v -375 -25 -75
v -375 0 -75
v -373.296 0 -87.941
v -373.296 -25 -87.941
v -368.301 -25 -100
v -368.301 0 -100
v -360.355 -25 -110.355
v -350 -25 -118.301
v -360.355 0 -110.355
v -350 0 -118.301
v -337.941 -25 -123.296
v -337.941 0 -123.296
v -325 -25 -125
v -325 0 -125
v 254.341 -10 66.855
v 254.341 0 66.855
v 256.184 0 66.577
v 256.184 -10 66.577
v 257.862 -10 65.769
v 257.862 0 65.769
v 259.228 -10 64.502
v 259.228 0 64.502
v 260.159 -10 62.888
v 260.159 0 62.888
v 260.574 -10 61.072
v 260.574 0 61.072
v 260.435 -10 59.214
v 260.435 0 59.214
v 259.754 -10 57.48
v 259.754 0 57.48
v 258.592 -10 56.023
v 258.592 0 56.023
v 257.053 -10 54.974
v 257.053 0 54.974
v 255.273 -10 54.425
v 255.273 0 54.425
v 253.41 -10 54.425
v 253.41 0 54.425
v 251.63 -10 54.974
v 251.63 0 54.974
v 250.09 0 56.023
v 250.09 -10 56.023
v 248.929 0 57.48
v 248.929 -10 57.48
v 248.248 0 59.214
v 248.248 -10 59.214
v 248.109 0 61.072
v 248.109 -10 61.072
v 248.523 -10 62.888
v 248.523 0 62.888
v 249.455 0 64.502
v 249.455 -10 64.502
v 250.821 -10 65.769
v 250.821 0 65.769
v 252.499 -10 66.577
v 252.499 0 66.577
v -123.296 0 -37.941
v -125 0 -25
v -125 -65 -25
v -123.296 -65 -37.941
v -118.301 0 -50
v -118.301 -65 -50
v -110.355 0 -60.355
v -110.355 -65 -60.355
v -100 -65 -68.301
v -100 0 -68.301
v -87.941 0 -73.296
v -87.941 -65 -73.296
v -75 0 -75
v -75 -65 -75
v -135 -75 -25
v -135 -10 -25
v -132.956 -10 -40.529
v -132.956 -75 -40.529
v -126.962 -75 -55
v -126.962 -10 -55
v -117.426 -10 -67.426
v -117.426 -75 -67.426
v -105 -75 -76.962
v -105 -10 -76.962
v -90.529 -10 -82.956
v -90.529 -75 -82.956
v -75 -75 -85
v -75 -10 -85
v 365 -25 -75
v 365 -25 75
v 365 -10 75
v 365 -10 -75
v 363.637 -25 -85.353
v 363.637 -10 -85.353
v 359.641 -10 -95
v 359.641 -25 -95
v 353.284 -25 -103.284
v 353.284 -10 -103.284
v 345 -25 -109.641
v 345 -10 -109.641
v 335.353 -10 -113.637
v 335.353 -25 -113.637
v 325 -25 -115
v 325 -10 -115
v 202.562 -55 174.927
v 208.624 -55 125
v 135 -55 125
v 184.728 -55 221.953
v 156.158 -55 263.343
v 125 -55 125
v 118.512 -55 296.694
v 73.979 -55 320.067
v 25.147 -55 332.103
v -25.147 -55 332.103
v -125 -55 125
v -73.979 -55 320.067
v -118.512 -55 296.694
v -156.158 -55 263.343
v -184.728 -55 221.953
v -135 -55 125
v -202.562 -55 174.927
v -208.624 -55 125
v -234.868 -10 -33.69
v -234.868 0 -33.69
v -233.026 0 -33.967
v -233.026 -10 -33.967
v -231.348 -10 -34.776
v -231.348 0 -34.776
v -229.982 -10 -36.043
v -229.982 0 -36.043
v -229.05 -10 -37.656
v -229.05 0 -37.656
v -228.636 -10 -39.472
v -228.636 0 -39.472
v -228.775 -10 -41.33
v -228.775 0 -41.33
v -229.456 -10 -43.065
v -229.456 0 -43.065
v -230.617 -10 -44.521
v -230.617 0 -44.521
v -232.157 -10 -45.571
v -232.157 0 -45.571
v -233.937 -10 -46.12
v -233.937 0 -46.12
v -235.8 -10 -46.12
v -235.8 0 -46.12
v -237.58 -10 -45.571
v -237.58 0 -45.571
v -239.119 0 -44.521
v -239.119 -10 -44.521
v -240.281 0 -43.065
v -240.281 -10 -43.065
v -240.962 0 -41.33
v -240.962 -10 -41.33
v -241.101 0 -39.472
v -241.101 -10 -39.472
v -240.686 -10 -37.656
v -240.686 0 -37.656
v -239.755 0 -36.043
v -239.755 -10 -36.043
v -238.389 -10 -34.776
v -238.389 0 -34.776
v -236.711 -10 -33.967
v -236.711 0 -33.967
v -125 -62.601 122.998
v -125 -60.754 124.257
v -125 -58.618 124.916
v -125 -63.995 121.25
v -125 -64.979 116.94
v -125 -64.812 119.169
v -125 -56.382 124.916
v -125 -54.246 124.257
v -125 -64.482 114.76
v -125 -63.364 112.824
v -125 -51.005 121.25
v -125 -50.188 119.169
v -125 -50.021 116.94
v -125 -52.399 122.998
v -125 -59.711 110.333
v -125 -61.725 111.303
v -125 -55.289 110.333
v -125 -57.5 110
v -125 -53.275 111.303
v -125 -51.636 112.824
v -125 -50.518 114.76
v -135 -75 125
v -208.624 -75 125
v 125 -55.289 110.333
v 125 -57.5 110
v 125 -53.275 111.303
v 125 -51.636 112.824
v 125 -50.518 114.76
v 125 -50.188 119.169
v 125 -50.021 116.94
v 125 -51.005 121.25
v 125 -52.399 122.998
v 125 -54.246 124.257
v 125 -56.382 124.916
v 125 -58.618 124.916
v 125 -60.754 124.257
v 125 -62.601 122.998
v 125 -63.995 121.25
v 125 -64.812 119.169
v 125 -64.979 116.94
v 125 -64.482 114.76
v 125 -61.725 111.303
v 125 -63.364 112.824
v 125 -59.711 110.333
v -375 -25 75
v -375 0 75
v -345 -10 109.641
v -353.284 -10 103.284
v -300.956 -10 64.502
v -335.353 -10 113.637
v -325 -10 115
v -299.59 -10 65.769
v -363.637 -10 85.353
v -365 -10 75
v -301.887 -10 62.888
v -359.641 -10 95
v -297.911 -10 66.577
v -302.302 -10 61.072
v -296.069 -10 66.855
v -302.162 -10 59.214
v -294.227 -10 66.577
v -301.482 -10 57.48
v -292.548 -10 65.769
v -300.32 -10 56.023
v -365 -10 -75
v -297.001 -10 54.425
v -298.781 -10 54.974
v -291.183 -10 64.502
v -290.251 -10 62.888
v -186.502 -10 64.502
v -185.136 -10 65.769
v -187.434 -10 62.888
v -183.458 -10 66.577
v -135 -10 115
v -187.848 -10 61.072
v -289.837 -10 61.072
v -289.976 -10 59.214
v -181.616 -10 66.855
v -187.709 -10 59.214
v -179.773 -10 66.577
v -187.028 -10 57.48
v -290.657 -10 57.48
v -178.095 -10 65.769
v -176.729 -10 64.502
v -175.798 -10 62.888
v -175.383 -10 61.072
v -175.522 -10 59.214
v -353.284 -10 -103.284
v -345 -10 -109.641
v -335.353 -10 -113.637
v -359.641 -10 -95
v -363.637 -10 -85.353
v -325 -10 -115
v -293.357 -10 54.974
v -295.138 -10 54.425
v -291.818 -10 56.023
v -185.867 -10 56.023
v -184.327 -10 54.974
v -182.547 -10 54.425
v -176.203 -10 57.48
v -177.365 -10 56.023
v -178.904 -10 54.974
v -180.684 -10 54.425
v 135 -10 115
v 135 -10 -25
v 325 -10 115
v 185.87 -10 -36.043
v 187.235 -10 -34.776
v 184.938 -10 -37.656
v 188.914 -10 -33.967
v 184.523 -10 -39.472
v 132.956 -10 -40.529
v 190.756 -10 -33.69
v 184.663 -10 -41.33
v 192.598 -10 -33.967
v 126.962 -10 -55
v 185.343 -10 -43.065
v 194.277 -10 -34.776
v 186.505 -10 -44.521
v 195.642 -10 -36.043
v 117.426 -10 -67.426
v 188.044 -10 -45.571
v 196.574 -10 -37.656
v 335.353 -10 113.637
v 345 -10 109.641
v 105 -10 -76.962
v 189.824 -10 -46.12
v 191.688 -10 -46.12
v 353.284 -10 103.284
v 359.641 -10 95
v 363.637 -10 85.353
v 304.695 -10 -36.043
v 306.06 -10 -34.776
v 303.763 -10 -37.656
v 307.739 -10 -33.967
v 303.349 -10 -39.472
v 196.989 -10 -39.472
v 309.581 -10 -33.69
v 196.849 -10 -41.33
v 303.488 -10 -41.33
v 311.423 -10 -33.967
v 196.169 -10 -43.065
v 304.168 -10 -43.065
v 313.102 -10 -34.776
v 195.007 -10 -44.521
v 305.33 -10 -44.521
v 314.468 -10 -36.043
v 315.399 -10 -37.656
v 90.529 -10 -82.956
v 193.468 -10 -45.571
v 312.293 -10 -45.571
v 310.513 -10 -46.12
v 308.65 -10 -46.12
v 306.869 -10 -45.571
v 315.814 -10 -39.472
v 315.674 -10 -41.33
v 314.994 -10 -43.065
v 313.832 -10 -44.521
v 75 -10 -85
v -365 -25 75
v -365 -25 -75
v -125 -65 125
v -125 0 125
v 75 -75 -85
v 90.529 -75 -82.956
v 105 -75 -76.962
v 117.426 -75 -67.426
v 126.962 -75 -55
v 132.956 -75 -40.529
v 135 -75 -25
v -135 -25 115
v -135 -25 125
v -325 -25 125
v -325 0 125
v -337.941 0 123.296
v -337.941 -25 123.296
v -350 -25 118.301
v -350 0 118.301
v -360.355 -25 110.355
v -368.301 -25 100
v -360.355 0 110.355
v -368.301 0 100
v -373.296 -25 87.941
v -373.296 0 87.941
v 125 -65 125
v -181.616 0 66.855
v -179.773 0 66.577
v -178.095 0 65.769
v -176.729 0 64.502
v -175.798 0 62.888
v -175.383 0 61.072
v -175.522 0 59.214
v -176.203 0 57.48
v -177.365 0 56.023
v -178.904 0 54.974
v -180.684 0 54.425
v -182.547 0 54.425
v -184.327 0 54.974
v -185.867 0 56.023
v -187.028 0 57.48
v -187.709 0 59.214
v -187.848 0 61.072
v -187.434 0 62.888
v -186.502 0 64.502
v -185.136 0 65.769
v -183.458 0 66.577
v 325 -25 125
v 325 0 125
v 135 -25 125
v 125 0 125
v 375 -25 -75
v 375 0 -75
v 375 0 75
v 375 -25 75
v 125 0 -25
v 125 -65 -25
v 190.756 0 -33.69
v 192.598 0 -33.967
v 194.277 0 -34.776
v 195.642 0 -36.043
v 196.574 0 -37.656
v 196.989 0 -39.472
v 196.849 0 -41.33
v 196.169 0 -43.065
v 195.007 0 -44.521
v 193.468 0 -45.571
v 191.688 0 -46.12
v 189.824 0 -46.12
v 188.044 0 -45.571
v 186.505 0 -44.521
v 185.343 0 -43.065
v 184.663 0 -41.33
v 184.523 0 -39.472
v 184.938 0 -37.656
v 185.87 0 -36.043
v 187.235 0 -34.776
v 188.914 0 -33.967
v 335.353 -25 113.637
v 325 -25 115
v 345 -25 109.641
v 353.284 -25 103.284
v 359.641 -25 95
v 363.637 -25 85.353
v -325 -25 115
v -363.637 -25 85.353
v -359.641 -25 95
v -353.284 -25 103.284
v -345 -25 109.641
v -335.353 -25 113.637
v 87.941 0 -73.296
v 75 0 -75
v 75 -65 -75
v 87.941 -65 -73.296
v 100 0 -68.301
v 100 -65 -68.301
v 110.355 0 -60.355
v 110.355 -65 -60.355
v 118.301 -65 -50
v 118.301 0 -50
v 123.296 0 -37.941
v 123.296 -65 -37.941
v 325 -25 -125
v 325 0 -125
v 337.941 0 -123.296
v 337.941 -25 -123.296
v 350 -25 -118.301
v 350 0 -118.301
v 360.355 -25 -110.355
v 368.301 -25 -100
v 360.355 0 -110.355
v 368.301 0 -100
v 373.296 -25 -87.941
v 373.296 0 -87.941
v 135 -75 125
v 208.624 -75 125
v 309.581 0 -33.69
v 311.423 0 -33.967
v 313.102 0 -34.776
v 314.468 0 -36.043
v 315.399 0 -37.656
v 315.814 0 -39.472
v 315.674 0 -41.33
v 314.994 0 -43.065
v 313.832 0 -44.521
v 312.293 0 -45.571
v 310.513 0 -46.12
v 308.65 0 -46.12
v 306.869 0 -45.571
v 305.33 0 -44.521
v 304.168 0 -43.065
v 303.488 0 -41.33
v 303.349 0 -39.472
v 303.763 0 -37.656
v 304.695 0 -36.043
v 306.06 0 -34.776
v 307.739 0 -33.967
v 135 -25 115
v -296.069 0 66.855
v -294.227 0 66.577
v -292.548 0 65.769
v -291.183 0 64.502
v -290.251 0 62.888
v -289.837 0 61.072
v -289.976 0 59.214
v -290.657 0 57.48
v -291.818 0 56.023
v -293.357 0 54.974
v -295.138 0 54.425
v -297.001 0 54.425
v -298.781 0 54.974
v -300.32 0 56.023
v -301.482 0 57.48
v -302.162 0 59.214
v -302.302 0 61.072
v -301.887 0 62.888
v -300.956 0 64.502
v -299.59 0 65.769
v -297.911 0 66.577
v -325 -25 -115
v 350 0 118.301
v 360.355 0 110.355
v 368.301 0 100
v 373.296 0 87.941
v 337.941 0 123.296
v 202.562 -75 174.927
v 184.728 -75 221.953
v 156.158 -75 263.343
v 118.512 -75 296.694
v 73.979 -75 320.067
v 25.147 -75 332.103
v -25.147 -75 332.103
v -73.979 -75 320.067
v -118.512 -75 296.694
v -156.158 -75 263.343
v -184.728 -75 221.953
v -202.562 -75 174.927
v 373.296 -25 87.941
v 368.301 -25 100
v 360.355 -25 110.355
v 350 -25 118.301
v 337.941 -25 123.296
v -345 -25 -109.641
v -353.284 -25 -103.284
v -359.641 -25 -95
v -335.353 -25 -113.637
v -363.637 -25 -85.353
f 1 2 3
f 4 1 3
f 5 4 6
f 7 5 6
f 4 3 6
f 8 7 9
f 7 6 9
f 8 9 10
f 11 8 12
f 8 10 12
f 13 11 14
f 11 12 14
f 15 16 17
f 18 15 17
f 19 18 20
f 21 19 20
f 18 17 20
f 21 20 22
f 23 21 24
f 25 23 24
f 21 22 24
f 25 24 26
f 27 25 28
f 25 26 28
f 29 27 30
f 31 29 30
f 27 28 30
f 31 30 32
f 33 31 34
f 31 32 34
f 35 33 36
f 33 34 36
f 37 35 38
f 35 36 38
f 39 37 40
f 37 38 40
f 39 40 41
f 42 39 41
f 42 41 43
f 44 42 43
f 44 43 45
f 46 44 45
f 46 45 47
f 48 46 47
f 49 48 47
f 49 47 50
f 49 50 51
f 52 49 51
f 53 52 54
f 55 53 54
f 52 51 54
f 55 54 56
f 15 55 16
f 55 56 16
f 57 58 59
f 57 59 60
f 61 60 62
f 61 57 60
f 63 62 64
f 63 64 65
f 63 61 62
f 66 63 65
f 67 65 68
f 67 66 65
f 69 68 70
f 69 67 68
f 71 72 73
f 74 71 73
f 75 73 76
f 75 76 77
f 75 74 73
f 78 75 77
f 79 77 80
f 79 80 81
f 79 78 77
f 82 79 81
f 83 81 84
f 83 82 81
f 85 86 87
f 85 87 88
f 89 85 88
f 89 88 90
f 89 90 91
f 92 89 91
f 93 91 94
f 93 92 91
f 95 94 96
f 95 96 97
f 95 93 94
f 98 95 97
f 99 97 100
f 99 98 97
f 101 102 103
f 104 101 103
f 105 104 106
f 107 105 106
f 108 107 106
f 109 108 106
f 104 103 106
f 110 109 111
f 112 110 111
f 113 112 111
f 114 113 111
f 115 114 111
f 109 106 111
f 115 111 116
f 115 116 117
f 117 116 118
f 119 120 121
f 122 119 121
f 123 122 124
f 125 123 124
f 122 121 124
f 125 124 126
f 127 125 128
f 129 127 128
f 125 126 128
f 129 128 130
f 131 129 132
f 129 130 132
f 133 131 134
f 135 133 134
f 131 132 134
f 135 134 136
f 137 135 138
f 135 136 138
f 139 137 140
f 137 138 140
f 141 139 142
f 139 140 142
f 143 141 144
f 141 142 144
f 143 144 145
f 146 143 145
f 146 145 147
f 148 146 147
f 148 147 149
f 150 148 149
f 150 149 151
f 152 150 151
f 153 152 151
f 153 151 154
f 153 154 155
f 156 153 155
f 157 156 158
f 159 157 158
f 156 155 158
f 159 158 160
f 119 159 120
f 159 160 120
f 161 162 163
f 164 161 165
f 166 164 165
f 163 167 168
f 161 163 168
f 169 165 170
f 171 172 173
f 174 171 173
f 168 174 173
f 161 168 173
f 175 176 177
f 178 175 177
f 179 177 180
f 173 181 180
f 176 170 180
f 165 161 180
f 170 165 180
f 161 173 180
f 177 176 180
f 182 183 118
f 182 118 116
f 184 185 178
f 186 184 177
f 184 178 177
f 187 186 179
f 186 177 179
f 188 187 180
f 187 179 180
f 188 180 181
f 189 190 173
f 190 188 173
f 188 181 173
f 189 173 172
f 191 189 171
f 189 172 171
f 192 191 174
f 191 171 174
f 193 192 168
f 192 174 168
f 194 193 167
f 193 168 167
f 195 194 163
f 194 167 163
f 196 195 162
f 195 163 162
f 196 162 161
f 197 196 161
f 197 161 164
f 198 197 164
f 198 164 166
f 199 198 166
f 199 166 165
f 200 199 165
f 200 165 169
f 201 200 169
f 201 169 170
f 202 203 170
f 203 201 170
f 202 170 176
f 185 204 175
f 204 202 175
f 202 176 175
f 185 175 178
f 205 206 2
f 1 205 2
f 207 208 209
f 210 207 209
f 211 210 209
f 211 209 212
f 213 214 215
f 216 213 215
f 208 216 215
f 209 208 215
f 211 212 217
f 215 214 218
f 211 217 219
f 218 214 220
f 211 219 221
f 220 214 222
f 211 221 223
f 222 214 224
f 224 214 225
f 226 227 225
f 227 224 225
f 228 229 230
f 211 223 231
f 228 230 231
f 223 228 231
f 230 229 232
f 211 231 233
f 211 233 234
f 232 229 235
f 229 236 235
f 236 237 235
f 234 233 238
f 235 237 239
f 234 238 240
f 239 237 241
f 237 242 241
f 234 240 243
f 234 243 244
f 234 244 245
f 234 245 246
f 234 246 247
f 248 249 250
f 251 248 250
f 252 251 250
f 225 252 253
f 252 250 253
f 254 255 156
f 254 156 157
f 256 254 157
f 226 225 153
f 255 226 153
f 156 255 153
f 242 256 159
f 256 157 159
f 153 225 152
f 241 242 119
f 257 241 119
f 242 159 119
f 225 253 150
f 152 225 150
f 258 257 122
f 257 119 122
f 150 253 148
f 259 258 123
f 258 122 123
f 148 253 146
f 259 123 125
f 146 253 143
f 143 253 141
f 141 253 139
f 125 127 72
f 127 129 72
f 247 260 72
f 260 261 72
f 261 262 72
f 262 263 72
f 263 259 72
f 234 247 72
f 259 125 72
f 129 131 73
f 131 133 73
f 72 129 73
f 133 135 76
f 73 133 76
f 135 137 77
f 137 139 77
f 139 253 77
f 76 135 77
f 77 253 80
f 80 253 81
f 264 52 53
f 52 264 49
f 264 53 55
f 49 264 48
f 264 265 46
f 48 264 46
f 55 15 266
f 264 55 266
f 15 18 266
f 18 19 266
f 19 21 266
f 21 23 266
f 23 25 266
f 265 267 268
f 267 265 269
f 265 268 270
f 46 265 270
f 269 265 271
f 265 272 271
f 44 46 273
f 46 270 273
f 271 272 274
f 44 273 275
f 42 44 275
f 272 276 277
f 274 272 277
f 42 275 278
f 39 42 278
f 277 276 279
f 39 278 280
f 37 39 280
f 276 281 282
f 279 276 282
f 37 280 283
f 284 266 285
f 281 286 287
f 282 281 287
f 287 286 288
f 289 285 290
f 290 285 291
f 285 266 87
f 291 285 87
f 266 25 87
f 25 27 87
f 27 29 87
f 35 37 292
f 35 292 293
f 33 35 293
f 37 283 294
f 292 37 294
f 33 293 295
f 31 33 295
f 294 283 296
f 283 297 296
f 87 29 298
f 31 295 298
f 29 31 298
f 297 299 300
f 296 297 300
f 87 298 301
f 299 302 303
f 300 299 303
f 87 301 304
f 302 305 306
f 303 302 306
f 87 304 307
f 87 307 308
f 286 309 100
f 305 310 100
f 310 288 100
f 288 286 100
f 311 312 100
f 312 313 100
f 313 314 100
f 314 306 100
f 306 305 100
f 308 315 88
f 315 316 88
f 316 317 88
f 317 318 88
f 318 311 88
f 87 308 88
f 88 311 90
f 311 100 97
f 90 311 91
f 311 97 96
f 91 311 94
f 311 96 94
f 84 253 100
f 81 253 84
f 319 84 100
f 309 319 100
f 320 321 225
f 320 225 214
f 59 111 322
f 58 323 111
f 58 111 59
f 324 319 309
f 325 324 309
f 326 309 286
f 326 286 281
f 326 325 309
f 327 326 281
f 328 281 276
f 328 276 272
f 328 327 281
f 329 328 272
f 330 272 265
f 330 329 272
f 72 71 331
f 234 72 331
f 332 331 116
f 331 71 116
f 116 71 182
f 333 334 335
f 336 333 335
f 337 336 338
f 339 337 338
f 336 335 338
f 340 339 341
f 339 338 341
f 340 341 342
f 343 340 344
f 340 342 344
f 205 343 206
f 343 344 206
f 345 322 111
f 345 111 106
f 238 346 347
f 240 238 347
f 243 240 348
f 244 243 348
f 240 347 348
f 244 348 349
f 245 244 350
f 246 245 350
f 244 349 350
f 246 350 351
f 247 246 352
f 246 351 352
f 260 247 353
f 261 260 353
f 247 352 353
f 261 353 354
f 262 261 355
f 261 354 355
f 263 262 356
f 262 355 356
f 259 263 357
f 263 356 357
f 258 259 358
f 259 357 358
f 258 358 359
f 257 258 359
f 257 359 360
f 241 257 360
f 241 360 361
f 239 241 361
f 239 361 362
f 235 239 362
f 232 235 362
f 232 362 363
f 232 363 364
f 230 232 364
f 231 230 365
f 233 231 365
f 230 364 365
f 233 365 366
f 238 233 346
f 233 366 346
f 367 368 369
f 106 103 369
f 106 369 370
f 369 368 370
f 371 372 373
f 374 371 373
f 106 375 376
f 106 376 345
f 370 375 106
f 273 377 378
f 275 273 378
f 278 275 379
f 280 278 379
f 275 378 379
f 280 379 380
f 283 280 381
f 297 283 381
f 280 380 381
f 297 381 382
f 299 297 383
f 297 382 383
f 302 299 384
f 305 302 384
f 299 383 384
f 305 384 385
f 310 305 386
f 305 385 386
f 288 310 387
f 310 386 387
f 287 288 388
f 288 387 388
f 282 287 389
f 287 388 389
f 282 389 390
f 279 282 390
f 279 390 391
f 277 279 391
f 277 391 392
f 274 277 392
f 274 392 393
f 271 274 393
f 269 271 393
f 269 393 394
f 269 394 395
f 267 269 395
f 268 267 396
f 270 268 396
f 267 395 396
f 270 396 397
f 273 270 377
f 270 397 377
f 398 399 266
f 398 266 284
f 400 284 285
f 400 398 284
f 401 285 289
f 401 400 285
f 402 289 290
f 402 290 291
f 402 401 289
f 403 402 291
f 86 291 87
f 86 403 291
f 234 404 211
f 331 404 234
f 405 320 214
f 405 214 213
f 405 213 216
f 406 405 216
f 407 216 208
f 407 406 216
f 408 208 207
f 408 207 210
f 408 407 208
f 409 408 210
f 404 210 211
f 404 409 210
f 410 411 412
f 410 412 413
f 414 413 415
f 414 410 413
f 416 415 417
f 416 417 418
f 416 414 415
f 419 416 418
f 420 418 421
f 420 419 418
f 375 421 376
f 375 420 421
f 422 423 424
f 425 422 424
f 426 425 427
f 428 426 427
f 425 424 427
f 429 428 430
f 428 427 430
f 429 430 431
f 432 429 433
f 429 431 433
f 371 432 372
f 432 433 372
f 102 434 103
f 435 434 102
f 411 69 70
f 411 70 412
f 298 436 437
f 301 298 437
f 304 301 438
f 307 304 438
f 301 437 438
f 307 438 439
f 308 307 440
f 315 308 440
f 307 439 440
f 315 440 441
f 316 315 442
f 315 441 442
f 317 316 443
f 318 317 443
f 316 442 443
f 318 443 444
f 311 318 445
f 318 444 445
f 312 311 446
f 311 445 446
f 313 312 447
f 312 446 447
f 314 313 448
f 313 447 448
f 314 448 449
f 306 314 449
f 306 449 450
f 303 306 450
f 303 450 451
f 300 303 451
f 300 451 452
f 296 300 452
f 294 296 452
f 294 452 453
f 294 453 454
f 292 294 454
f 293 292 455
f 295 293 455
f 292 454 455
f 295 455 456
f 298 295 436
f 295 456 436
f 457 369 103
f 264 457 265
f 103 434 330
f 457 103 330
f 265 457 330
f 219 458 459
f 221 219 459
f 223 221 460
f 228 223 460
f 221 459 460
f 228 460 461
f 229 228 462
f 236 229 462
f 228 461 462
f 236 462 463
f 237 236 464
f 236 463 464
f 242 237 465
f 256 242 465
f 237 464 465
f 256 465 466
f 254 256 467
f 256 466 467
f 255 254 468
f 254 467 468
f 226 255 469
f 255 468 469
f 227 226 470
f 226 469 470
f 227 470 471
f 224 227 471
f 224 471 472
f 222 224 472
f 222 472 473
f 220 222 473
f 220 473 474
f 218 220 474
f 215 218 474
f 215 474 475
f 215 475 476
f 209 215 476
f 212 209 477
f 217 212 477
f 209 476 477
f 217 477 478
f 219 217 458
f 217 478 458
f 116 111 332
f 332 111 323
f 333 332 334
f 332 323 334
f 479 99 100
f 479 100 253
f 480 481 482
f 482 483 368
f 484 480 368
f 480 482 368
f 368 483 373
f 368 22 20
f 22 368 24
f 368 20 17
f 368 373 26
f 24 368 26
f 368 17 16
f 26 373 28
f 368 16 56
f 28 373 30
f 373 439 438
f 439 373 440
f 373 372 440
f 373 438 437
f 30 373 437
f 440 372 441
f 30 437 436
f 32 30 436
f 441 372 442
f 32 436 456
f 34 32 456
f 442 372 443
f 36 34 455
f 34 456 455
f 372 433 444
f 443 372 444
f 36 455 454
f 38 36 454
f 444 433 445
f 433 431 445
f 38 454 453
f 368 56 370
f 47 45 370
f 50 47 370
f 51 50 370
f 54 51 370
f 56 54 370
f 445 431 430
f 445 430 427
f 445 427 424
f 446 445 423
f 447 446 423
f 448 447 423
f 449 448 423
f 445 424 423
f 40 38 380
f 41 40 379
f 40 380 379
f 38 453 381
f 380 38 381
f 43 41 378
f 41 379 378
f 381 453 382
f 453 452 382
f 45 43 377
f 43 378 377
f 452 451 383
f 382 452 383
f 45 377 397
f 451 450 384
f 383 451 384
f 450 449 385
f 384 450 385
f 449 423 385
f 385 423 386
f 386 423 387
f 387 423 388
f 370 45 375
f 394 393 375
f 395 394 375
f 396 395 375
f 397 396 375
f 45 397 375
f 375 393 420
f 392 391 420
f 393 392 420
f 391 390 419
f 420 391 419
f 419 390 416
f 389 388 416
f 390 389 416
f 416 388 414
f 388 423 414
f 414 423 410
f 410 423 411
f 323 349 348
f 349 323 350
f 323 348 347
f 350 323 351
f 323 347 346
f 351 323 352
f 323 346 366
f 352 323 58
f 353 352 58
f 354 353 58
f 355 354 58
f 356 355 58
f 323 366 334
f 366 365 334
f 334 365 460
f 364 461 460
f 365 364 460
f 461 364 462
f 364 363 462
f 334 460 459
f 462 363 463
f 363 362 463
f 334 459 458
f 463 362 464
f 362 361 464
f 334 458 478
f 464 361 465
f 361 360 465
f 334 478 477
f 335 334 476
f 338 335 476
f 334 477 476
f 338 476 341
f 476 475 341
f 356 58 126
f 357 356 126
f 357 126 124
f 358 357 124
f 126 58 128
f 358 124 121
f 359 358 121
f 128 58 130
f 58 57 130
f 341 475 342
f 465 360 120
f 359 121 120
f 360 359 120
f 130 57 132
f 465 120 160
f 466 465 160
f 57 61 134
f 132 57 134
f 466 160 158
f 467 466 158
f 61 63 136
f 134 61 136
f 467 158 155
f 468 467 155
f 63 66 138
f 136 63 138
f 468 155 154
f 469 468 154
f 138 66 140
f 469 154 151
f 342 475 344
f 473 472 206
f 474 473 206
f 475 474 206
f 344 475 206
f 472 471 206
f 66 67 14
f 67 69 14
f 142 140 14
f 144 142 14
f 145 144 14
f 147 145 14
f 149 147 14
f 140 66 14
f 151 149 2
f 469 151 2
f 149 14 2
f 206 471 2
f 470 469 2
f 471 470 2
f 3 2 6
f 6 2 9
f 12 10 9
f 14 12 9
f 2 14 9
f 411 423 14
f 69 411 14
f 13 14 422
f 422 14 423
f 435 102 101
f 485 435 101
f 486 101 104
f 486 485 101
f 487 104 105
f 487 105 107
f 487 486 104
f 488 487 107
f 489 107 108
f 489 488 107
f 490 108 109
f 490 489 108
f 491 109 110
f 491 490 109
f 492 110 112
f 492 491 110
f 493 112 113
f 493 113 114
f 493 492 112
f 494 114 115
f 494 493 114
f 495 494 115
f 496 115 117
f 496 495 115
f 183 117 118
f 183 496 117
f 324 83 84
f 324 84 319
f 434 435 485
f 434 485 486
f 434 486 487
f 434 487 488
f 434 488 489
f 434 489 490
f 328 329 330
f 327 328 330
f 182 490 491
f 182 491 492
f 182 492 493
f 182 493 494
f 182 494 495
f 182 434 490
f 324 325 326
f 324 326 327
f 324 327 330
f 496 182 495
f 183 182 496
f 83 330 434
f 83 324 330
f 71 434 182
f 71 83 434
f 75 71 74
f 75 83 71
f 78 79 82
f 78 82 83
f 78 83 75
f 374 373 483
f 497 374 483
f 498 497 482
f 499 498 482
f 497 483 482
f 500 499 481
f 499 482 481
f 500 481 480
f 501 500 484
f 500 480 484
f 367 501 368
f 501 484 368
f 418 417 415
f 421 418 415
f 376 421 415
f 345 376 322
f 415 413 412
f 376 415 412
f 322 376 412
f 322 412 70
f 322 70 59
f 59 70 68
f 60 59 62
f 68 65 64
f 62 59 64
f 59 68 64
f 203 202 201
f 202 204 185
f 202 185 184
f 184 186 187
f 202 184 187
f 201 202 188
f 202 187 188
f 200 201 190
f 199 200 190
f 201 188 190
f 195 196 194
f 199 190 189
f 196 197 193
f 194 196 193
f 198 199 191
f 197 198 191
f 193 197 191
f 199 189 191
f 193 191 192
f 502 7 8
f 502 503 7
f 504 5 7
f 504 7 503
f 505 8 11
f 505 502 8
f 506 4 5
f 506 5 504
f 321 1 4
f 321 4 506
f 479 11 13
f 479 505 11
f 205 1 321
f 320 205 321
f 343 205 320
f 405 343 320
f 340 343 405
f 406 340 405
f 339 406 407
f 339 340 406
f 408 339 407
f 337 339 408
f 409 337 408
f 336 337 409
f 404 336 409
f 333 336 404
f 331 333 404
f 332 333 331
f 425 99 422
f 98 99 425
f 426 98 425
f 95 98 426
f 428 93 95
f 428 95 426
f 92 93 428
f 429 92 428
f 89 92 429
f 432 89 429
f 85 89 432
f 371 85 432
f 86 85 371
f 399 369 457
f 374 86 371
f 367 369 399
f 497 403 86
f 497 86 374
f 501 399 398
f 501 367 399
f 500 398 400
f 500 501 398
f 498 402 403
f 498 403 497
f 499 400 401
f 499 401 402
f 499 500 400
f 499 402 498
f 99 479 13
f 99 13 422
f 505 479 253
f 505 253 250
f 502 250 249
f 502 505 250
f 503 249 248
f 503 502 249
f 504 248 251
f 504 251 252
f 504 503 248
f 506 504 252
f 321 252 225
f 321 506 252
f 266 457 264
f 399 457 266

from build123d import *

# Parameters (mm, degrees)
BOSS_EXTRUDE1_DEPTH      = 75
CUT_EXTRUDE1_DEPTH       = 65
SHELL1_START             = -75
SHELL1_DEPTH             = 65
CUT_EXTRUDE3_DEPTH       = 50
SKETCH6_R                = 6.25
CUT_EXTRUDE4_DEPTH       = 10
BOSS_EXTRUDE2_DEPTH      = 10
BOSS_EXTRUDE2_DEPTH_BACK = 10
BOSS_EXTRUDE5_REACH      = 607.748
SKETCH10_R               = 7.5


# Read off the part's stored shape, not the designer's step: Shell1
with BuildPart() as part:
    # Sketch1 → Boss-Extrude1 (new body)
    with BuildSketch(Plane(origin=(0, 0, 0), x_dir=(1, 0, 0), z_dir=(0, 1, 0))):
        with BuildLine():
            Line((325, -125), (-325, -125))
            ThreePointArc((-325, -125), (-360.355339059, -110.355339059), (-375, -75))
            Line((-375, -75), (-375, 75))
            ThreePointArc((-375, 75), (-360.355339059, 110.355339059), (-325, 125))
            Line((-325, 125), (325, 125))
            ThreePointArc((325, 125), (360.355339059, 110.355339059), (375, 75))
            Line((375, 75), (375, -75))
            ThreePointArc((375, -75), (360.355339059, -110.355339059), (325, -125))
        make_face()
    extrude(amount=-BOSS_EXTRUDE1_DEPTH)

    # Sketch2 → Cut-Extrude1 (cut)
    with BuildSketch(Plane(origin=(0, 0, 0), x_dir=(1, 0, 0), z_dir=(0, 1, 0))):
        with BuildLine():
            Line((125, -125), (-125, -125))
            Line((-125, -125), (-125, 25))
            ThreePointArc((-125, 25), (-110.355339059, 60.355339059), (-75, 75))
            Line((-75, 75), (75, 75))
            ThreePointArc((75, 75), (110.355339059, 60.355339059), (125, 25))
            Line((125, 25), (125, -125))
        make_face()
    extrude(amount=-CUT_EXTRUDE1_DEPTH, mode=Mode.SUBTRACT)

    # Shell1 outline → Shell1 (cut)
    with BuildSketch(Plane(origin=(0, 0, 0), x_dir=(1, 0, 0), z_dir=(0, 1, 0)).offset(SHELL1_START)):
        with BuildLine():
            ThreePointArc((-365, -75), (-353.284271247, -103.284271247), (-325, -115))
            Line((-325, -115), (-135, -115))
            Line((-135, -115), (-135, 25))
            ThreePointArc((-135, 25), (-117.426406871, 67.426406871), (-75, 85))
            Line((-75, 85), (75, 85))
            ThreePointArc((75, 85), (117.426406871, 67.426406871), (135, 25))
            Line((135, 25), (135, -115))
            Line((135, -115), (325, -115))
            ThreePointArc((325, -115), (353.284271247, -103.284271247), (365, -75))
            Line((365, -75), (365, 75))
            ThreePointArc((365, 75), (353.284271247, 103.284271247), (325, 115))
            Line((325, 115), (-325, 115))
            ThreePointArc((-325, 115), (-353.284271247, 103.284271247), (-365, 75))
            Line((-365, 75), (-365, -75))
        make_face()
    extrude(amount=SHELL1_DEPTH, mode=Mode.SUBTRACT)

    # Sketch5 → Cut-Extrude3 (cut)
    with BuildSketch(Plane.XZ.offset(75)):
        with BuildLine():
            ThreePointArc((375, 75), (360.355339059, 110.355339059), (325, 125))
            Line((325, 125), (135, 125))
            Line((135, 125), (135, 115))
            Line((135, 115), (325, 115))
            ThreePointArc((325, 115), (353.284271247, 103.284271247), (365, 75))
            Line((365, 75), (365, -75))
            ThreePointArc((365, -75), (353.284271247, -103.284271247), (325, -115))
            Line((325, -115), (-325, -115))
            ThreePointArc((-325, -115), (-353.284271247, -103.284271247), (-365, -75))
            Line((-365, -75), (-365, 75))
            ThreePointArc((-365, 75), (-353.284271247, 103.284271247), (-325, 115))
            Line((-325, 115), (-135, 115))
            Line((-135, 115), (-135, 125))
            Line((-135, 125), (-325, 125))
            ThreePointArc((-325, 125), (-360.355339059, 110.355339059), (-375, 75))
            Line((-375, 75), (-375, -75))
            ThreePointArc((-375, -75), (-360.355339059, -110.355339059), (-325, -125))
            Line((-325, -125), (325, -125))
            ThreePointArc((325, -125), (360.355339059, -110.355339059), (375, -75))
            Line((375, -75), (375, 75))
        make_face()
    extrude(amount=-CUT_EXTRUDE3_DEPTH, mode=Mode.SUBTRACT)

    # Sketch6 → Cut-Extrude4 (cut)
    with BuildSketch(Plane(origin=(0, 0, 0), x_dir=(1, 0, 0), z_dir=(0, 1, 0))):
        with Locations(Location((-181.615600277, -60.604768145, 0), (0, 0, 270))):
            Circle(SKETCH6_R)
        with Locations(Location((-296.0691952, -60.604768145, 0), (0, 0, 270))):
            Circle(SKETCH6_R)
        with Locations(Location((-234.868314581, 39.939535728, 0), (0, 0, 270))):
            Circle(SKETCH6_R)
        with Locations(Location((190.755991538, 39.939535728, 0), (0, 0, 270))):
            Circle(SKETCH6_R)
        with Locations(Location((309.581077934, 39.939535728, 0), (0, 0, 270))):
            Circle(SKETCH6_R)
        with Locations(Location((254.341322051, -60.604768145, 0), (0, 0, 270))):
            Circle(SKETCH6_R)
    extrude(amount=-CUT_EXTRUDE4_DEPTH, mode=Mode.SUBTRACT)

    # Sketch7 → Boss-Extrude2 (add, two sides: drawn at the far end of the back side and taken through both)
    with BuildSketch(Plane(origin=(0, -65, 0), x_dir=(1, 0, 0), z_dir=(0, 1, 0)).offset(-BOSS_EXTRUDE2_DEPTH_BACK)):
        with BuildLine():
            Line((-208.624281034, -125), (208.624281034, -125))
            ThreePointArc((208.624281034, -125), (0, -333.624281034), (-208.624281034, -125))
        make_face()
    extrude(amount=BOSS_EXTRUDE2_DEPTH + BOSS_EXTRUDE2_DEPTH_BACK)


with BuildPart() as body_2:

    # Sketch10 → Boss-Extrude5 (new, up to next)
    with BuildSketch(Plane(origin=(-125, 0, 0), x_dir=(0, 0, -1), z_dir=(1, 0, 0)), mode=Mode.PRIVATE) as boss_extrude5_sk1:
        with Locations((-117.5, -57.5)):
            Circle(SKETCH10_R)
    boss_extrude5_tool1 = extrude(boss_extrude5_sk1.sketch, amount=BOSS_EXTRUDE5_REACH, mode=Mode.PRIVATE) - part.part
    add(boss_extrude5_tool1.solids().sort_by_distance((-125, -57.5, 117.5))[0])


solid = Compound([part.part, body_2.part])
